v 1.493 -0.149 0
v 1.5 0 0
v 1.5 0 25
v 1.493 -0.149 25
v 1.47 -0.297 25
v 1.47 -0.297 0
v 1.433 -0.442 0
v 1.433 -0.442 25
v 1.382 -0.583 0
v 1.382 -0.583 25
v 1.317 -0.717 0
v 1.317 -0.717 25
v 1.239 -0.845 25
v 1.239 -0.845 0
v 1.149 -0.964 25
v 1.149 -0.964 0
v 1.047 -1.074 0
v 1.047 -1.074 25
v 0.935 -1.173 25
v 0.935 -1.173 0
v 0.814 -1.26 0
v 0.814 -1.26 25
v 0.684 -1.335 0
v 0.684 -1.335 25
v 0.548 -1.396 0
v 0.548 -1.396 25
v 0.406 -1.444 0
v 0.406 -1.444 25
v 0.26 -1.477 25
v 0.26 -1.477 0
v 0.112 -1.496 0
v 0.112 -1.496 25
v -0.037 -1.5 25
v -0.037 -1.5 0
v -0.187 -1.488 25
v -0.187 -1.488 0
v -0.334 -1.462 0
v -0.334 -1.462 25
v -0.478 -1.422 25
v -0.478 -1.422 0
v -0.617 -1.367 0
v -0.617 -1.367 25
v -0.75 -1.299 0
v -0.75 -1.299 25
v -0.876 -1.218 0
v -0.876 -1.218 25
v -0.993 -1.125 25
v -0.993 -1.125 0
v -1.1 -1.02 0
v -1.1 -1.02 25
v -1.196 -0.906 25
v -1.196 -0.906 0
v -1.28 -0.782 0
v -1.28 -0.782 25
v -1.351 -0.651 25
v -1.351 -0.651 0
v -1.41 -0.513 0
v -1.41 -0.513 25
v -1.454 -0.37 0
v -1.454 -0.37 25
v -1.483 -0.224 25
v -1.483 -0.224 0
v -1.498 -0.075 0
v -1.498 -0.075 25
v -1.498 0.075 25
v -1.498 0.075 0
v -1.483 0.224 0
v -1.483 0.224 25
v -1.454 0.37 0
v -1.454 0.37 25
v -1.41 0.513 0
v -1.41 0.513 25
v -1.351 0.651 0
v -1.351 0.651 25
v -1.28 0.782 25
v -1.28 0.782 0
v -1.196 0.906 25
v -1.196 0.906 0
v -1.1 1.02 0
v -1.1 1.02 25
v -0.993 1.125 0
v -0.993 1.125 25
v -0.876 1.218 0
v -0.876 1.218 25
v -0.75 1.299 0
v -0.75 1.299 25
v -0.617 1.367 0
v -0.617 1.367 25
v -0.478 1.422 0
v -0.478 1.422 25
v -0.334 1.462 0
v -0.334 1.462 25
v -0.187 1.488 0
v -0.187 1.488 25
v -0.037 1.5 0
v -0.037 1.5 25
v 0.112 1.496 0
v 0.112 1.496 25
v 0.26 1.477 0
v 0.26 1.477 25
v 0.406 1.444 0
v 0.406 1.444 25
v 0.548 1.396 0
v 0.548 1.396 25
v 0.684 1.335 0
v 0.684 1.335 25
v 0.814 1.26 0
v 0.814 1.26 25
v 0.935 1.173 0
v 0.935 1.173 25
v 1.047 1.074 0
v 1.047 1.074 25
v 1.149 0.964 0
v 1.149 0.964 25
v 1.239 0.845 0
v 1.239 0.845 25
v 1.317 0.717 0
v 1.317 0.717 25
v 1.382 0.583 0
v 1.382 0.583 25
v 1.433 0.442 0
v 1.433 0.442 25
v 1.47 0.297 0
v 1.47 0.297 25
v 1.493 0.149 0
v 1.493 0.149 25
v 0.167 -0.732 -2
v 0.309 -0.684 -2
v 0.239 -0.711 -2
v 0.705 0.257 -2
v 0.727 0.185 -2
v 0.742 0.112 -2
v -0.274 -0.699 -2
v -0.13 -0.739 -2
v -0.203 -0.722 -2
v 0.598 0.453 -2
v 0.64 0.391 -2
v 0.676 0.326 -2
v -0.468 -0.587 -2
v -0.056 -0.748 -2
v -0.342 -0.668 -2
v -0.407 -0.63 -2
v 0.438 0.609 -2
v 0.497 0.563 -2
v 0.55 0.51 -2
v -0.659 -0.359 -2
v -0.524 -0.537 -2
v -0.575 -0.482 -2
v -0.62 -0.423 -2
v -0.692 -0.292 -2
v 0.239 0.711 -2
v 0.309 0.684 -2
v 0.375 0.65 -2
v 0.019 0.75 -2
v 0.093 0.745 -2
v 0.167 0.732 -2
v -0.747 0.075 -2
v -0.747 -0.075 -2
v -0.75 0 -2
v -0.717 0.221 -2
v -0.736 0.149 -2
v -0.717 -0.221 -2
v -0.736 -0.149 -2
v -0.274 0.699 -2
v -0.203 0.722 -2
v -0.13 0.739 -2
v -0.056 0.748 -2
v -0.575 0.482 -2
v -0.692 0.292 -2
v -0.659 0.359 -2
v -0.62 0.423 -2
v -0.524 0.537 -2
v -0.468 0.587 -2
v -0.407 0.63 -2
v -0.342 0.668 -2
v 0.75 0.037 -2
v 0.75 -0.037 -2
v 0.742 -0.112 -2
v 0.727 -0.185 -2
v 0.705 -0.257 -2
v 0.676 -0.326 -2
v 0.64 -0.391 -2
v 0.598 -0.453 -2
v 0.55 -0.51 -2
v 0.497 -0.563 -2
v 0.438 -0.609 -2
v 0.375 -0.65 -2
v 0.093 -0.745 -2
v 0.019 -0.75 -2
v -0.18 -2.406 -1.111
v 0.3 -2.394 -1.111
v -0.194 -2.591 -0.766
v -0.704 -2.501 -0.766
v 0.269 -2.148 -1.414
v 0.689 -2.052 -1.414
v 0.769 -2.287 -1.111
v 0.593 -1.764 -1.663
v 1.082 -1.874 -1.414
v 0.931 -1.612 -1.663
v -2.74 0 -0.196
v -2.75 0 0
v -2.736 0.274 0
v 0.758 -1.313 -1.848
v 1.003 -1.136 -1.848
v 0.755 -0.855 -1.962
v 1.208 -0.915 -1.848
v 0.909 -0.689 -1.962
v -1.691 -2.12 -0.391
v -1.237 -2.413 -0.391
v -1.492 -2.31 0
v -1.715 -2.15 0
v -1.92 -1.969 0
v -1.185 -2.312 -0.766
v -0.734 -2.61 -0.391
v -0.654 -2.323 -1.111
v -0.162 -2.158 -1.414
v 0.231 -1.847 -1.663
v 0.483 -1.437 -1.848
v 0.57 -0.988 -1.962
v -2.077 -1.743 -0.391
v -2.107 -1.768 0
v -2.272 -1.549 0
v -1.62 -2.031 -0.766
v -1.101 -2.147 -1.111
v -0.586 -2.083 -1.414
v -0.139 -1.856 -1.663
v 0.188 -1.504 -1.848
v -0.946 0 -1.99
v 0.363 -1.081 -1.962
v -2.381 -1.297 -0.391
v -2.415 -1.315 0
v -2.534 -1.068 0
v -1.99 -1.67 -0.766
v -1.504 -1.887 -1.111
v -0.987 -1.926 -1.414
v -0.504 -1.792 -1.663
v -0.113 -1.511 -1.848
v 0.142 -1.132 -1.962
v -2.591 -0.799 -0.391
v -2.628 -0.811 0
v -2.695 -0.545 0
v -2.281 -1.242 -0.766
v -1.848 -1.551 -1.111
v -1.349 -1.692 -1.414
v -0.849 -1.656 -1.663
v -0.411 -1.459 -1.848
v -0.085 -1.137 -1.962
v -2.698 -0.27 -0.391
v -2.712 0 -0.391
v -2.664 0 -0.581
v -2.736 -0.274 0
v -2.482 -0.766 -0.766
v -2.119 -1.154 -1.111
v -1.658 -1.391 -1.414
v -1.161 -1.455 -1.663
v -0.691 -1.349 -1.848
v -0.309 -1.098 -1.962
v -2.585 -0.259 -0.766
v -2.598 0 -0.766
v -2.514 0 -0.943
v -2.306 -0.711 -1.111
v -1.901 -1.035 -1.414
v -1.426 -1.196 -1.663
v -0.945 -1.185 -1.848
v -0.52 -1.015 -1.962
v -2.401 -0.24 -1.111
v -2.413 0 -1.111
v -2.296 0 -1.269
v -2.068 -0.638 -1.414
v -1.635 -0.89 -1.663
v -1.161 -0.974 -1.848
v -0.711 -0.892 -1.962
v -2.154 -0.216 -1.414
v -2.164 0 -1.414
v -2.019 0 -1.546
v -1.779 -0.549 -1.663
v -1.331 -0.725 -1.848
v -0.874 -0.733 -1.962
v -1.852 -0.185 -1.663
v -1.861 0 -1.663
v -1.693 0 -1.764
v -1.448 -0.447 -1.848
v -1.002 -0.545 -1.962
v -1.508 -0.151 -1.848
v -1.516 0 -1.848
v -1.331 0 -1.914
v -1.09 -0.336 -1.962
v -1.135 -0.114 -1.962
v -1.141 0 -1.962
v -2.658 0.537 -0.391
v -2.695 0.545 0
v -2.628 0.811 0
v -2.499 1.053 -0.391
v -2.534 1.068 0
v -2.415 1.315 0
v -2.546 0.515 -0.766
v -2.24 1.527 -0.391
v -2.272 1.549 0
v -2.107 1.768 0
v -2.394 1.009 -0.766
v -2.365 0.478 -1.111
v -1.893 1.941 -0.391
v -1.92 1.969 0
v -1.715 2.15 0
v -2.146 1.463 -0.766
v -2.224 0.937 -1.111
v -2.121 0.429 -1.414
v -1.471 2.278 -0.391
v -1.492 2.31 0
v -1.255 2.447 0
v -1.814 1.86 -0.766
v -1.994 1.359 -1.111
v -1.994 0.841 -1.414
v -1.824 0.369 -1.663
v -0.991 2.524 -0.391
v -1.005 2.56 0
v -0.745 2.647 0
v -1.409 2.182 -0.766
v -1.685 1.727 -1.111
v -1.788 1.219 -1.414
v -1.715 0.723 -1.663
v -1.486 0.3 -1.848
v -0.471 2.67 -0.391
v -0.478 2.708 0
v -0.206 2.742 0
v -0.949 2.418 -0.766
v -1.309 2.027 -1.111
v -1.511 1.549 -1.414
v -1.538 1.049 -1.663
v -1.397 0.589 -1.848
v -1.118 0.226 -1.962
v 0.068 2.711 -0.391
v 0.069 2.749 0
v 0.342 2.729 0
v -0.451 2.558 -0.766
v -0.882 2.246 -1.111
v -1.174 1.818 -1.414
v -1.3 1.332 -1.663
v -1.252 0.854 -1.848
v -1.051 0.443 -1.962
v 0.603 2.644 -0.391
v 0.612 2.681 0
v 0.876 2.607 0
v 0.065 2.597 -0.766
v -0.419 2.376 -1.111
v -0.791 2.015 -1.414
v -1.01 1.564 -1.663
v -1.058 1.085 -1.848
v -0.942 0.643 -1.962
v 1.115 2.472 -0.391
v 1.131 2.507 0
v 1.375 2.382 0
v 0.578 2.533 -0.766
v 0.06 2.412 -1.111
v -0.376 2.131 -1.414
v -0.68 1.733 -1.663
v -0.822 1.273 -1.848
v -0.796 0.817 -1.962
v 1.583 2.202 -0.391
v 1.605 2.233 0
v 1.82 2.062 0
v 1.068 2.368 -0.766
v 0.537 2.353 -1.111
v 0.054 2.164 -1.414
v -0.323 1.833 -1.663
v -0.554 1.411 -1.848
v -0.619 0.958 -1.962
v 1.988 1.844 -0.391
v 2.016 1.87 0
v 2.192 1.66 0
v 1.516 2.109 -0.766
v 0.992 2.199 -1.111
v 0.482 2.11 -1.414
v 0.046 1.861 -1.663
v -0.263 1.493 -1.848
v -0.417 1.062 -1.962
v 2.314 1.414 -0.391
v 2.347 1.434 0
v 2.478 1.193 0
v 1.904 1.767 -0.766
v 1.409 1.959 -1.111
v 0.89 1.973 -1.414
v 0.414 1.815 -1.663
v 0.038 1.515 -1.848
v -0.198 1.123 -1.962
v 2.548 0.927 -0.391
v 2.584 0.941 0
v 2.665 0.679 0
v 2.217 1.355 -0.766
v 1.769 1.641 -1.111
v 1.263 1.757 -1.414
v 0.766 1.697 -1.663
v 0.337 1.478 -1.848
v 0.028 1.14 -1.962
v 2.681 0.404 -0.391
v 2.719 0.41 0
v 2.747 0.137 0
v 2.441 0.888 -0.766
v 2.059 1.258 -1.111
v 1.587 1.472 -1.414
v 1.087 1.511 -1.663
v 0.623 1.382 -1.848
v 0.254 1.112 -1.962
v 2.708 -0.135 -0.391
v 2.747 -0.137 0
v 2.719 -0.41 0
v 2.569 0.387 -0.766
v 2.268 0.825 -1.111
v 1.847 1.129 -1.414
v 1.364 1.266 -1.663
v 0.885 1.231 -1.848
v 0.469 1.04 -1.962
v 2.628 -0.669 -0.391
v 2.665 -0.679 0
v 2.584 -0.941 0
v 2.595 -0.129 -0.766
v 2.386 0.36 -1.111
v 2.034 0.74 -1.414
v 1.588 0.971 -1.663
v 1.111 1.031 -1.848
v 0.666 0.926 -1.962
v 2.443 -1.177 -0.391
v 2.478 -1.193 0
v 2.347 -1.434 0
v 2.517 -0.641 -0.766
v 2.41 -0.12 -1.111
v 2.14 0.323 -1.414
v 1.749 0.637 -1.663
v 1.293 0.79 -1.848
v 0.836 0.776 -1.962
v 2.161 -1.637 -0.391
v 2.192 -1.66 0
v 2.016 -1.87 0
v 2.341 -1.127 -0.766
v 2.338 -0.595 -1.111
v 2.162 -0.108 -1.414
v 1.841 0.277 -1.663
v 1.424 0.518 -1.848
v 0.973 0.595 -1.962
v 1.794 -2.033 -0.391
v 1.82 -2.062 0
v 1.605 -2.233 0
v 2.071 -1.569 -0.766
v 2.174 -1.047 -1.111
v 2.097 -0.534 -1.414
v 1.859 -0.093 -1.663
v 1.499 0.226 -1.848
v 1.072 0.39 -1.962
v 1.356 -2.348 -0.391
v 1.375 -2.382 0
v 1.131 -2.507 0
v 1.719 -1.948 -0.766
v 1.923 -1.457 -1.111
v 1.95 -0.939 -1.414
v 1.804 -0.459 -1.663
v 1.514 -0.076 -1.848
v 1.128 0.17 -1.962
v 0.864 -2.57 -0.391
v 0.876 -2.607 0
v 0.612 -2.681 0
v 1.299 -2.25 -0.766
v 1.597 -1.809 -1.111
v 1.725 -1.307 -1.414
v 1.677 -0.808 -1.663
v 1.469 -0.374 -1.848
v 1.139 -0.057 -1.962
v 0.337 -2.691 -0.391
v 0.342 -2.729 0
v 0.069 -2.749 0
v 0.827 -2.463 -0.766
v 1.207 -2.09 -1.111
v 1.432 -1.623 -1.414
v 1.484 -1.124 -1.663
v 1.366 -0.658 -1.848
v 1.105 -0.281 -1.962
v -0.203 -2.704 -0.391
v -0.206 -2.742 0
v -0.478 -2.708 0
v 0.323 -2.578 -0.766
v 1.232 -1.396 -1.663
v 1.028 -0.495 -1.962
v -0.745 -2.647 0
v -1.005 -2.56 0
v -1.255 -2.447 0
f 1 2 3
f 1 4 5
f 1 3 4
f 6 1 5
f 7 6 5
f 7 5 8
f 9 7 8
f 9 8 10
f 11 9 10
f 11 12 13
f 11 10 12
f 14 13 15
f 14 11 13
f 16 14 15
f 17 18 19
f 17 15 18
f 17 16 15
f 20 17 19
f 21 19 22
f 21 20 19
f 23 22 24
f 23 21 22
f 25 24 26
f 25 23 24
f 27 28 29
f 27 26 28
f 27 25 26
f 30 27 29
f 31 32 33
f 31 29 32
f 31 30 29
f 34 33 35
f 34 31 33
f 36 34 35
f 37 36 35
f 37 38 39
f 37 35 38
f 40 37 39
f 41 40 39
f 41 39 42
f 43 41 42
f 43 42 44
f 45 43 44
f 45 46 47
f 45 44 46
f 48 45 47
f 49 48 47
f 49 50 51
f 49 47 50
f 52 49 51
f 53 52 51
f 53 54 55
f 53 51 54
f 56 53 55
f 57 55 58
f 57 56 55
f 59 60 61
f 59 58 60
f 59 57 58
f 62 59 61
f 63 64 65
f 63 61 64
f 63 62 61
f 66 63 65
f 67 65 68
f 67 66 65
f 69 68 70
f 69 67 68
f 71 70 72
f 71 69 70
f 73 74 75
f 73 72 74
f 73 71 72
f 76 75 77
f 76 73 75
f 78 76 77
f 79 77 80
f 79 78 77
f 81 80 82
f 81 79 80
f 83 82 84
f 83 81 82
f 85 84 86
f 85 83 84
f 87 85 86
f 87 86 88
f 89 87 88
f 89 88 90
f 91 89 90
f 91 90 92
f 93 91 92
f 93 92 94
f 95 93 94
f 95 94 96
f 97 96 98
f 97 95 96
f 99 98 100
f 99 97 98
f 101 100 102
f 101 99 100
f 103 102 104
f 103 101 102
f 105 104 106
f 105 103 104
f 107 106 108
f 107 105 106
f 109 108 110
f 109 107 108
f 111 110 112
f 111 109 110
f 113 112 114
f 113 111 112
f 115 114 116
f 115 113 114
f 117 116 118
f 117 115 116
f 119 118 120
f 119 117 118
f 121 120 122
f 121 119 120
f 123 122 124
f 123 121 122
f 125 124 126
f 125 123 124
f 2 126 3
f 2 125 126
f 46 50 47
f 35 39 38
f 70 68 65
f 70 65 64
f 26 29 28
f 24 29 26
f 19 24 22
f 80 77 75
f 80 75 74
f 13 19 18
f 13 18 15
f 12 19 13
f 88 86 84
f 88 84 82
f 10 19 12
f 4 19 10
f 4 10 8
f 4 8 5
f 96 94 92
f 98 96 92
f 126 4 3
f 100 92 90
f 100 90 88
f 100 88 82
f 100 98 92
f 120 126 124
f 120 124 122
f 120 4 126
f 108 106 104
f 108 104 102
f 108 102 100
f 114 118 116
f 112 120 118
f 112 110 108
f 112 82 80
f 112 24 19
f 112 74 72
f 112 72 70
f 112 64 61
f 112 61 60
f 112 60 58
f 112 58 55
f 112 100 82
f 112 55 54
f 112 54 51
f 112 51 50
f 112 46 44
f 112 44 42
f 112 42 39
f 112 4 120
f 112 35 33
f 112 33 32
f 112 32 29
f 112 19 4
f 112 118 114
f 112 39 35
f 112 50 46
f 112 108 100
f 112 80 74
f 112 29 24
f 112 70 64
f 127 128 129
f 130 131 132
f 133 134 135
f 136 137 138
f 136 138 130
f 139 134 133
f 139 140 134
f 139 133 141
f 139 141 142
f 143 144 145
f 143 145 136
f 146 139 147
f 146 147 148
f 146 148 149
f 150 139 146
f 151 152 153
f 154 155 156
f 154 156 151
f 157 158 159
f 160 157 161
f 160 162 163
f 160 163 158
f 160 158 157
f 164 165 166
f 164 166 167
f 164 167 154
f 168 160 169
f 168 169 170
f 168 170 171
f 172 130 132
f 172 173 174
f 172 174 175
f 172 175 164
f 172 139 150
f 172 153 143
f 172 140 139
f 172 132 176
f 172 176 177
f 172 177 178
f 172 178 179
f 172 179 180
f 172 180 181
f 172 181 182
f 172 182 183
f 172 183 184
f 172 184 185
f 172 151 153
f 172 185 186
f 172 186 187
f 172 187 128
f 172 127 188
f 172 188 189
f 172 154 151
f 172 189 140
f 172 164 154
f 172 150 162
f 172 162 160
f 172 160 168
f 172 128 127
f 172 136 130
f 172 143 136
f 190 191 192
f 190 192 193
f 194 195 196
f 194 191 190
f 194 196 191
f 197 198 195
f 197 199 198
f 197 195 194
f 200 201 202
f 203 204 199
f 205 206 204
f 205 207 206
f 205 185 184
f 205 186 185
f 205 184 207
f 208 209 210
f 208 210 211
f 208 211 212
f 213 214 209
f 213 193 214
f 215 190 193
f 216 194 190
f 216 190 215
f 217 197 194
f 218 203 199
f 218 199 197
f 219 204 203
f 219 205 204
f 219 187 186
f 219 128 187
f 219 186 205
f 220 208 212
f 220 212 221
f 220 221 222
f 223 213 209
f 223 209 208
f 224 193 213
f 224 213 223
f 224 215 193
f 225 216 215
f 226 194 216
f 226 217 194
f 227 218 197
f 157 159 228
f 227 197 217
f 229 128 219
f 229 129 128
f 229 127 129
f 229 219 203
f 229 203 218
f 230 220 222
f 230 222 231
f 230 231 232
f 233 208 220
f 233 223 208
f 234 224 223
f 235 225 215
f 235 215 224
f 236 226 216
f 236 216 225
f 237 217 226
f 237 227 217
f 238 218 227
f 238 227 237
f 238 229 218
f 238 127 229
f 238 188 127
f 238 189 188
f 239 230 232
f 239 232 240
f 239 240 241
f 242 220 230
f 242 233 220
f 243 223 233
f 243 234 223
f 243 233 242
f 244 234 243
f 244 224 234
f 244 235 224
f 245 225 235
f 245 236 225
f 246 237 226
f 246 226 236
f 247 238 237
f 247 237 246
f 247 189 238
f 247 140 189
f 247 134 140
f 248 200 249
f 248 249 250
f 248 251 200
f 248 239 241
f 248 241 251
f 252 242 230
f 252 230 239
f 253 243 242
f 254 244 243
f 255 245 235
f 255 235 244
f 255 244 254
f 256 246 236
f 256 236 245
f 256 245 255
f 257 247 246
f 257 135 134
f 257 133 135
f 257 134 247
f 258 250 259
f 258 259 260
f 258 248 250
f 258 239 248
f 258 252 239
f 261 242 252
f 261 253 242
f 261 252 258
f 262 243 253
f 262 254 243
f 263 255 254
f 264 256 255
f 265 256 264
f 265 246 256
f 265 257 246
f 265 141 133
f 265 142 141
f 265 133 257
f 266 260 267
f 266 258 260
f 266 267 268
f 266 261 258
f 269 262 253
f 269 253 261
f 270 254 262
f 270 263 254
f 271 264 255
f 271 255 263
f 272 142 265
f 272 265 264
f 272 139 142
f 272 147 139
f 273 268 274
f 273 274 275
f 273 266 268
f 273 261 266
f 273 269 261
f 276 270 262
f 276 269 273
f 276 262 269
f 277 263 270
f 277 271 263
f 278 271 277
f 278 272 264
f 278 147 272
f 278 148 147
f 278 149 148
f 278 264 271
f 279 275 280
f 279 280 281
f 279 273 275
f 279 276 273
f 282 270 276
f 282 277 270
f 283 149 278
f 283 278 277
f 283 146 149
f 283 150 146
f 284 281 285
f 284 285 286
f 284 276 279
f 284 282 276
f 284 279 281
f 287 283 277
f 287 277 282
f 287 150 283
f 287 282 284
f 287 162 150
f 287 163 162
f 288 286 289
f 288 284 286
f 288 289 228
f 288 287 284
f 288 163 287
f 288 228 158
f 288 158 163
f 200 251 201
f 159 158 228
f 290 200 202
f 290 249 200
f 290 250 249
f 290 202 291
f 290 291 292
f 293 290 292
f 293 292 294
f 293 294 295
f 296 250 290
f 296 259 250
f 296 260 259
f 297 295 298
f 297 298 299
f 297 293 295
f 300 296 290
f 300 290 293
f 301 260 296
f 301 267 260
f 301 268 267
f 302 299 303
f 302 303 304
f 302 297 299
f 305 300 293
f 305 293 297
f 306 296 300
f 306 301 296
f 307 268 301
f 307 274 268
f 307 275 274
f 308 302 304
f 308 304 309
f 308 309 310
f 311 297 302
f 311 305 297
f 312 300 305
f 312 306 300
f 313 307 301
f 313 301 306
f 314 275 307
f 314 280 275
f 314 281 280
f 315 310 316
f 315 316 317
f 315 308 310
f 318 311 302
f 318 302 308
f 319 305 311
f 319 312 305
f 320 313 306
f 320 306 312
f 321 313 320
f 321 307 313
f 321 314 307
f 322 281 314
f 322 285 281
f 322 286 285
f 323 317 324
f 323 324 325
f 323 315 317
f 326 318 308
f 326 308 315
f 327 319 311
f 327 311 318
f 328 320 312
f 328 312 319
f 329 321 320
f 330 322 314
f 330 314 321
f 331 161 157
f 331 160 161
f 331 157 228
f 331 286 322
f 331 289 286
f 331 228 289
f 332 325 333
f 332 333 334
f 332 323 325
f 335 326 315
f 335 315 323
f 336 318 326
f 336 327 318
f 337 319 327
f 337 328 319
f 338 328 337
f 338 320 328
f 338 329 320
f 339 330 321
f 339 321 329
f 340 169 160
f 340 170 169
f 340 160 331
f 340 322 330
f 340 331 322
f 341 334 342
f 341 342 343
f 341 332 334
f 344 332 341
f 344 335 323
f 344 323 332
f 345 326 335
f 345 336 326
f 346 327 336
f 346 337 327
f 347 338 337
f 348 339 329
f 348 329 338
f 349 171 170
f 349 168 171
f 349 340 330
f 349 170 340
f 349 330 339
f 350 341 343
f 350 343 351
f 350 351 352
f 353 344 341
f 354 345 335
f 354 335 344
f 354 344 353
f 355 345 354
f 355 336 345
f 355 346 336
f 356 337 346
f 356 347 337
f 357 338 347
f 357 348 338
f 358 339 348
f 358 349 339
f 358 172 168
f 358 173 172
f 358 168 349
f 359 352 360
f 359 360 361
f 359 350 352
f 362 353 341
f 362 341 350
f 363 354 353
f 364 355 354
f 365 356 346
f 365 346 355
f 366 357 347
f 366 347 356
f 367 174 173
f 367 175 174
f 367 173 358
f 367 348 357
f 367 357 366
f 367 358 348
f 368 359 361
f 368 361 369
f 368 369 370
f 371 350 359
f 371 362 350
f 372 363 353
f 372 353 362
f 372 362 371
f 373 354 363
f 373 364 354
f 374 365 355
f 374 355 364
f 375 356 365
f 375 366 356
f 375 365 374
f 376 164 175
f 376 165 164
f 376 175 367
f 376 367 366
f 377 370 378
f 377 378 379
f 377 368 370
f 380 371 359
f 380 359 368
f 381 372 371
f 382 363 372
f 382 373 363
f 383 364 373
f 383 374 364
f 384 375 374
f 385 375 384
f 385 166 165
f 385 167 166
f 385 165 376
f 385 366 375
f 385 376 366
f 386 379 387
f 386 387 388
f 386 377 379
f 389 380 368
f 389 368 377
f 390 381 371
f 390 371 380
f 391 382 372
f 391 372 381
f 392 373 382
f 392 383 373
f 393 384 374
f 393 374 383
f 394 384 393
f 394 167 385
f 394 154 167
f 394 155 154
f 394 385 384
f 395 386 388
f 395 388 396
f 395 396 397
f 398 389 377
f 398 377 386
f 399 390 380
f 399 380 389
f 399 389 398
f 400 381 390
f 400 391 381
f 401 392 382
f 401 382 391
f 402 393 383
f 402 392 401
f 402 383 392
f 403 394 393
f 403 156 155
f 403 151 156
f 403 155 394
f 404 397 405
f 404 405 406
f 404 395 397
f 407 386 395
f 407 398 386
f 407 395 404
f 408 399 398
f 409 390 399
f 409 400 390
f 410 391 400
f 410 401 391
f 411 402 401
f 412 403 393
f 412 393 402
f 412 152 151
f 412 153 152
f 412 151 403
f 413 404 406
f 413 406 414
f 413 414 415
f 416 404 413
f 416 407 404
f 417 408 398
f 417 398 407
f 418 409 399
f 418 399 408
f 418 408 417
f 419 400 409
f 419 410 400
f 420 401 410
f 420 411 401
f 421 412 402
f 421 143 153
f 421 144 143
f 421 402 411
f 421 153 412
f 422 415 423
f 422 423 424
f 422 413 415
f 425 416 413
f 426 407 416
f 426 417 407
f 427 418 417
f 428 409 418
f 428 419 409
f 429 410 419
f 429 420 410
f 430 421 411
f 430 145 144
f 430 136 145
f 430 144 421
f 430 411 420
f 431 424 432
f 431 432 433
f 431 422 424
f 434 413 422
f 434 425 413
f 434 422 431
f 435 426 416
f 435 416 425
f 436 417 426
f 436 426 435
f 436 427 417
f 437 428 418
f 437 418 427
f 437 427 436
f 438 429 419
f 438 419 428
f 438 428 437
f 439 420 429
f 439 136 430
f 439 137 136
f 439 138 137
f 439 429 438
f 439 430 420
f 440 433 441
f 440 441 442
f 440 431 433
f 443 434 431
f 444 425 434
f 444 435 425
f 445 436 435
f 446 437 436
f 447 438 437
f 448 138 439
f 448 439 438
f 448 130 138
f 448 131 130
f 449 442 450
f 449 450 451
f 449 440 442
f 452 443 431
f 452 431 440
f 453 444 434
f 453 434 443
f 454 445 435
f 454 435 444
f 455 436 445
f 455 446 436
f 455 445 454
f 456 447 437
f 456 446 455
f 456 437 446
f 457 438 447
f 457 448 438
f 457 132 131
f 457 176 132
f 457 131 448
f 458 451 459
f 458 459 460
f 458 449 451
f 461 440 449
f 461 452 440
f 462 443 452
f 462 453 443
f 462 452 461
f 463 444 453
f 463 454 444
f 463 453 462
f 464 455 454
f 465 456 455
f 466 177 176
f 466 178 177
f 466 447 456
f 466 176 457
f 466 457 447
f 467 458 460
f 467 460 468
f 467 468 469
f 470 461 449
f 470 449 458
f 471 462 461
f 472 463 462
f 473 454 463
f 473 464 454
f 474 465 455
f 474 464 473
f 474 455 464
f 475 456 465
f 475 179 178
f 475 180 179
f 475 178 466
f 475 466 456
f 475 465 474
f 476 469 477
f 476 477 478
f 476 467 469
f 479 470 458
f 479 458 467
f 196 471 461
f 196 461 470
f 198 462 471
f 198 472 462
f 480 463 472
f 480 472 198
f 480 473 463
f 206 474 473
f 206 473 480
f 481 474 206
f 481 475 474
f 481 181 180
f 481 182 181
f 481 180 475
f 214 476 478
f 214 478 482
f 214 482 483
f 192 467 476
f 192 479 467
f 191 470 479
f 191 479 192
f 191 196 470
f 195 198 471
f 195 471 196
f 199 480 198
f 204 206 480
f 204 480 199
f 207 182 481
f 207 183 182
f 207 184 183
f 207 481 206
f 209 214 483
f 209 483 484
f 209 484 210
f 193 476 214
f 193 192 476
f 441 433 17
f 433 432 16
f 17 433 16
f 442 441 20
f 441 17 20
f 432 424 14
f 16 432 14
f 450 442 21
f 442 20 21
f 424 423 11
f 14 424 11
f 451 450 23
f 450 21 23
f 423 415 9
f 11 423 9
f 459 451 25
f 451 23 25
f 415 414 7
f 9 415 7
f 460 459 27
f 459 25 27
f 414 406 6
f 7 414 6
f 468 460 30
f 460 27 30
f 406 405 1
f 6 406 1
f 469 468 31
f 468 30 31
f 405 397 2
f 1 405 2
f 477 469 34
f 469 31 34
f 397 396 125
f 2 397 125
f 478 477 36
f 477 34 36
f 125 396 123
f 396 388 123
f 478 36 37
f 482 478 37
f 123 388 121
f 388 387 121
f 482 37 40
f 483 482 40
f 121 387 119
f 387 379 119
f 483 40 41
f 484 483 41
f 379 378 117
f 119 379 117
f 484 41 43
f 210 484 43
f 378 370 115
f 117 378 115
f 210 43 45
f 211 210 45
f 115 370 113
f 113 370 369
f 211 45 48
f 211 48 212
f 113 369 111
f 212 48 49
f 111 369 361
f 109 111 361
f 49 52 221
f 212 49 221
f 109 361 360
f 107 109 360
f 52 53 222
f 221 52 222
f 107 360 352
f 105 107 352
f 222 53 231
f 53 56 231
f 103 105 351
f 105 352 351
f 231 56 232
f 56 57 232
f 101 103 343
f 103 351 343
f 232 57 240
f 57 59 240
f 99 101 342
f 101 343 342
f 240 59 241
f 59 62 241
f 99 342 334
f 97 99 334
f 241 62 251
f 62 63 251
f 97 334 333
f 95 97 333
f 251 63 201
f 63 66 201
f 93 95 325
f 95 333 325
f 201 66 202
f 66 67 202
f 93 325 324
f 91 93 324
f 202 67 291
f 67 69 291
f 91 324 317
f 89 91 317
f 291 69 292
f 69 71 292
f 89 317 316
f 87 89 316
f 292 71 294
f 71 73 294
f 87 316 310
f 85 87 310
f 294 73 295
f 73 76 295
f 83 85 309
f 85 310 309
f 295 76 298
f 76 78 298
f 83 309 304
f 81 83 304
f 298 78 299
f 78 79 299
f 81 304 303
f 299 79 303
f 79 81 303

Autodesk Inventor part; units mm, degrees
ref_plane "YZ Plane" through (0, 0, 0) normal (1, 0, 0) x (0, 1, 0)
ref_plane "XZ Plane" through (0, 0, 0) normal (0, 1, 0) x (-1, 0, 0)
ref_plane "XY Plane" through (0, 0, 0) normal (0, 0, 1) x (1, 0, 0)
sketch "スケッチ1" plane through (0, 0, 0) normal (0, 0, 1) x (1, 0, 0)
  circle A0 centre (0, 0) radius 1.5
  dimension "d0" = 3
extrude "押し出し1" add sketch "スケッチ1" along normal blind 25
sketch "スケッチ2" plane through (0, 0, 0) normal (0, 0, -1) x (-1, 0, 0)
  circle A0 centre (0, 0) radius 2.75
  dimension "d3" = 5.5
extrude "押し出し2" add sketch "スケッチ2" along normal blind 2
fillet "フィレット1" radius 2 1 edges at (2.75, 0, -2)
thread "ねじ1" size "M3x0.5" class "6g" standard "ANSI Metric M Profile" full length
properties part number "ネジ鍋m3,25" material "鋼、高強度、低合金"
